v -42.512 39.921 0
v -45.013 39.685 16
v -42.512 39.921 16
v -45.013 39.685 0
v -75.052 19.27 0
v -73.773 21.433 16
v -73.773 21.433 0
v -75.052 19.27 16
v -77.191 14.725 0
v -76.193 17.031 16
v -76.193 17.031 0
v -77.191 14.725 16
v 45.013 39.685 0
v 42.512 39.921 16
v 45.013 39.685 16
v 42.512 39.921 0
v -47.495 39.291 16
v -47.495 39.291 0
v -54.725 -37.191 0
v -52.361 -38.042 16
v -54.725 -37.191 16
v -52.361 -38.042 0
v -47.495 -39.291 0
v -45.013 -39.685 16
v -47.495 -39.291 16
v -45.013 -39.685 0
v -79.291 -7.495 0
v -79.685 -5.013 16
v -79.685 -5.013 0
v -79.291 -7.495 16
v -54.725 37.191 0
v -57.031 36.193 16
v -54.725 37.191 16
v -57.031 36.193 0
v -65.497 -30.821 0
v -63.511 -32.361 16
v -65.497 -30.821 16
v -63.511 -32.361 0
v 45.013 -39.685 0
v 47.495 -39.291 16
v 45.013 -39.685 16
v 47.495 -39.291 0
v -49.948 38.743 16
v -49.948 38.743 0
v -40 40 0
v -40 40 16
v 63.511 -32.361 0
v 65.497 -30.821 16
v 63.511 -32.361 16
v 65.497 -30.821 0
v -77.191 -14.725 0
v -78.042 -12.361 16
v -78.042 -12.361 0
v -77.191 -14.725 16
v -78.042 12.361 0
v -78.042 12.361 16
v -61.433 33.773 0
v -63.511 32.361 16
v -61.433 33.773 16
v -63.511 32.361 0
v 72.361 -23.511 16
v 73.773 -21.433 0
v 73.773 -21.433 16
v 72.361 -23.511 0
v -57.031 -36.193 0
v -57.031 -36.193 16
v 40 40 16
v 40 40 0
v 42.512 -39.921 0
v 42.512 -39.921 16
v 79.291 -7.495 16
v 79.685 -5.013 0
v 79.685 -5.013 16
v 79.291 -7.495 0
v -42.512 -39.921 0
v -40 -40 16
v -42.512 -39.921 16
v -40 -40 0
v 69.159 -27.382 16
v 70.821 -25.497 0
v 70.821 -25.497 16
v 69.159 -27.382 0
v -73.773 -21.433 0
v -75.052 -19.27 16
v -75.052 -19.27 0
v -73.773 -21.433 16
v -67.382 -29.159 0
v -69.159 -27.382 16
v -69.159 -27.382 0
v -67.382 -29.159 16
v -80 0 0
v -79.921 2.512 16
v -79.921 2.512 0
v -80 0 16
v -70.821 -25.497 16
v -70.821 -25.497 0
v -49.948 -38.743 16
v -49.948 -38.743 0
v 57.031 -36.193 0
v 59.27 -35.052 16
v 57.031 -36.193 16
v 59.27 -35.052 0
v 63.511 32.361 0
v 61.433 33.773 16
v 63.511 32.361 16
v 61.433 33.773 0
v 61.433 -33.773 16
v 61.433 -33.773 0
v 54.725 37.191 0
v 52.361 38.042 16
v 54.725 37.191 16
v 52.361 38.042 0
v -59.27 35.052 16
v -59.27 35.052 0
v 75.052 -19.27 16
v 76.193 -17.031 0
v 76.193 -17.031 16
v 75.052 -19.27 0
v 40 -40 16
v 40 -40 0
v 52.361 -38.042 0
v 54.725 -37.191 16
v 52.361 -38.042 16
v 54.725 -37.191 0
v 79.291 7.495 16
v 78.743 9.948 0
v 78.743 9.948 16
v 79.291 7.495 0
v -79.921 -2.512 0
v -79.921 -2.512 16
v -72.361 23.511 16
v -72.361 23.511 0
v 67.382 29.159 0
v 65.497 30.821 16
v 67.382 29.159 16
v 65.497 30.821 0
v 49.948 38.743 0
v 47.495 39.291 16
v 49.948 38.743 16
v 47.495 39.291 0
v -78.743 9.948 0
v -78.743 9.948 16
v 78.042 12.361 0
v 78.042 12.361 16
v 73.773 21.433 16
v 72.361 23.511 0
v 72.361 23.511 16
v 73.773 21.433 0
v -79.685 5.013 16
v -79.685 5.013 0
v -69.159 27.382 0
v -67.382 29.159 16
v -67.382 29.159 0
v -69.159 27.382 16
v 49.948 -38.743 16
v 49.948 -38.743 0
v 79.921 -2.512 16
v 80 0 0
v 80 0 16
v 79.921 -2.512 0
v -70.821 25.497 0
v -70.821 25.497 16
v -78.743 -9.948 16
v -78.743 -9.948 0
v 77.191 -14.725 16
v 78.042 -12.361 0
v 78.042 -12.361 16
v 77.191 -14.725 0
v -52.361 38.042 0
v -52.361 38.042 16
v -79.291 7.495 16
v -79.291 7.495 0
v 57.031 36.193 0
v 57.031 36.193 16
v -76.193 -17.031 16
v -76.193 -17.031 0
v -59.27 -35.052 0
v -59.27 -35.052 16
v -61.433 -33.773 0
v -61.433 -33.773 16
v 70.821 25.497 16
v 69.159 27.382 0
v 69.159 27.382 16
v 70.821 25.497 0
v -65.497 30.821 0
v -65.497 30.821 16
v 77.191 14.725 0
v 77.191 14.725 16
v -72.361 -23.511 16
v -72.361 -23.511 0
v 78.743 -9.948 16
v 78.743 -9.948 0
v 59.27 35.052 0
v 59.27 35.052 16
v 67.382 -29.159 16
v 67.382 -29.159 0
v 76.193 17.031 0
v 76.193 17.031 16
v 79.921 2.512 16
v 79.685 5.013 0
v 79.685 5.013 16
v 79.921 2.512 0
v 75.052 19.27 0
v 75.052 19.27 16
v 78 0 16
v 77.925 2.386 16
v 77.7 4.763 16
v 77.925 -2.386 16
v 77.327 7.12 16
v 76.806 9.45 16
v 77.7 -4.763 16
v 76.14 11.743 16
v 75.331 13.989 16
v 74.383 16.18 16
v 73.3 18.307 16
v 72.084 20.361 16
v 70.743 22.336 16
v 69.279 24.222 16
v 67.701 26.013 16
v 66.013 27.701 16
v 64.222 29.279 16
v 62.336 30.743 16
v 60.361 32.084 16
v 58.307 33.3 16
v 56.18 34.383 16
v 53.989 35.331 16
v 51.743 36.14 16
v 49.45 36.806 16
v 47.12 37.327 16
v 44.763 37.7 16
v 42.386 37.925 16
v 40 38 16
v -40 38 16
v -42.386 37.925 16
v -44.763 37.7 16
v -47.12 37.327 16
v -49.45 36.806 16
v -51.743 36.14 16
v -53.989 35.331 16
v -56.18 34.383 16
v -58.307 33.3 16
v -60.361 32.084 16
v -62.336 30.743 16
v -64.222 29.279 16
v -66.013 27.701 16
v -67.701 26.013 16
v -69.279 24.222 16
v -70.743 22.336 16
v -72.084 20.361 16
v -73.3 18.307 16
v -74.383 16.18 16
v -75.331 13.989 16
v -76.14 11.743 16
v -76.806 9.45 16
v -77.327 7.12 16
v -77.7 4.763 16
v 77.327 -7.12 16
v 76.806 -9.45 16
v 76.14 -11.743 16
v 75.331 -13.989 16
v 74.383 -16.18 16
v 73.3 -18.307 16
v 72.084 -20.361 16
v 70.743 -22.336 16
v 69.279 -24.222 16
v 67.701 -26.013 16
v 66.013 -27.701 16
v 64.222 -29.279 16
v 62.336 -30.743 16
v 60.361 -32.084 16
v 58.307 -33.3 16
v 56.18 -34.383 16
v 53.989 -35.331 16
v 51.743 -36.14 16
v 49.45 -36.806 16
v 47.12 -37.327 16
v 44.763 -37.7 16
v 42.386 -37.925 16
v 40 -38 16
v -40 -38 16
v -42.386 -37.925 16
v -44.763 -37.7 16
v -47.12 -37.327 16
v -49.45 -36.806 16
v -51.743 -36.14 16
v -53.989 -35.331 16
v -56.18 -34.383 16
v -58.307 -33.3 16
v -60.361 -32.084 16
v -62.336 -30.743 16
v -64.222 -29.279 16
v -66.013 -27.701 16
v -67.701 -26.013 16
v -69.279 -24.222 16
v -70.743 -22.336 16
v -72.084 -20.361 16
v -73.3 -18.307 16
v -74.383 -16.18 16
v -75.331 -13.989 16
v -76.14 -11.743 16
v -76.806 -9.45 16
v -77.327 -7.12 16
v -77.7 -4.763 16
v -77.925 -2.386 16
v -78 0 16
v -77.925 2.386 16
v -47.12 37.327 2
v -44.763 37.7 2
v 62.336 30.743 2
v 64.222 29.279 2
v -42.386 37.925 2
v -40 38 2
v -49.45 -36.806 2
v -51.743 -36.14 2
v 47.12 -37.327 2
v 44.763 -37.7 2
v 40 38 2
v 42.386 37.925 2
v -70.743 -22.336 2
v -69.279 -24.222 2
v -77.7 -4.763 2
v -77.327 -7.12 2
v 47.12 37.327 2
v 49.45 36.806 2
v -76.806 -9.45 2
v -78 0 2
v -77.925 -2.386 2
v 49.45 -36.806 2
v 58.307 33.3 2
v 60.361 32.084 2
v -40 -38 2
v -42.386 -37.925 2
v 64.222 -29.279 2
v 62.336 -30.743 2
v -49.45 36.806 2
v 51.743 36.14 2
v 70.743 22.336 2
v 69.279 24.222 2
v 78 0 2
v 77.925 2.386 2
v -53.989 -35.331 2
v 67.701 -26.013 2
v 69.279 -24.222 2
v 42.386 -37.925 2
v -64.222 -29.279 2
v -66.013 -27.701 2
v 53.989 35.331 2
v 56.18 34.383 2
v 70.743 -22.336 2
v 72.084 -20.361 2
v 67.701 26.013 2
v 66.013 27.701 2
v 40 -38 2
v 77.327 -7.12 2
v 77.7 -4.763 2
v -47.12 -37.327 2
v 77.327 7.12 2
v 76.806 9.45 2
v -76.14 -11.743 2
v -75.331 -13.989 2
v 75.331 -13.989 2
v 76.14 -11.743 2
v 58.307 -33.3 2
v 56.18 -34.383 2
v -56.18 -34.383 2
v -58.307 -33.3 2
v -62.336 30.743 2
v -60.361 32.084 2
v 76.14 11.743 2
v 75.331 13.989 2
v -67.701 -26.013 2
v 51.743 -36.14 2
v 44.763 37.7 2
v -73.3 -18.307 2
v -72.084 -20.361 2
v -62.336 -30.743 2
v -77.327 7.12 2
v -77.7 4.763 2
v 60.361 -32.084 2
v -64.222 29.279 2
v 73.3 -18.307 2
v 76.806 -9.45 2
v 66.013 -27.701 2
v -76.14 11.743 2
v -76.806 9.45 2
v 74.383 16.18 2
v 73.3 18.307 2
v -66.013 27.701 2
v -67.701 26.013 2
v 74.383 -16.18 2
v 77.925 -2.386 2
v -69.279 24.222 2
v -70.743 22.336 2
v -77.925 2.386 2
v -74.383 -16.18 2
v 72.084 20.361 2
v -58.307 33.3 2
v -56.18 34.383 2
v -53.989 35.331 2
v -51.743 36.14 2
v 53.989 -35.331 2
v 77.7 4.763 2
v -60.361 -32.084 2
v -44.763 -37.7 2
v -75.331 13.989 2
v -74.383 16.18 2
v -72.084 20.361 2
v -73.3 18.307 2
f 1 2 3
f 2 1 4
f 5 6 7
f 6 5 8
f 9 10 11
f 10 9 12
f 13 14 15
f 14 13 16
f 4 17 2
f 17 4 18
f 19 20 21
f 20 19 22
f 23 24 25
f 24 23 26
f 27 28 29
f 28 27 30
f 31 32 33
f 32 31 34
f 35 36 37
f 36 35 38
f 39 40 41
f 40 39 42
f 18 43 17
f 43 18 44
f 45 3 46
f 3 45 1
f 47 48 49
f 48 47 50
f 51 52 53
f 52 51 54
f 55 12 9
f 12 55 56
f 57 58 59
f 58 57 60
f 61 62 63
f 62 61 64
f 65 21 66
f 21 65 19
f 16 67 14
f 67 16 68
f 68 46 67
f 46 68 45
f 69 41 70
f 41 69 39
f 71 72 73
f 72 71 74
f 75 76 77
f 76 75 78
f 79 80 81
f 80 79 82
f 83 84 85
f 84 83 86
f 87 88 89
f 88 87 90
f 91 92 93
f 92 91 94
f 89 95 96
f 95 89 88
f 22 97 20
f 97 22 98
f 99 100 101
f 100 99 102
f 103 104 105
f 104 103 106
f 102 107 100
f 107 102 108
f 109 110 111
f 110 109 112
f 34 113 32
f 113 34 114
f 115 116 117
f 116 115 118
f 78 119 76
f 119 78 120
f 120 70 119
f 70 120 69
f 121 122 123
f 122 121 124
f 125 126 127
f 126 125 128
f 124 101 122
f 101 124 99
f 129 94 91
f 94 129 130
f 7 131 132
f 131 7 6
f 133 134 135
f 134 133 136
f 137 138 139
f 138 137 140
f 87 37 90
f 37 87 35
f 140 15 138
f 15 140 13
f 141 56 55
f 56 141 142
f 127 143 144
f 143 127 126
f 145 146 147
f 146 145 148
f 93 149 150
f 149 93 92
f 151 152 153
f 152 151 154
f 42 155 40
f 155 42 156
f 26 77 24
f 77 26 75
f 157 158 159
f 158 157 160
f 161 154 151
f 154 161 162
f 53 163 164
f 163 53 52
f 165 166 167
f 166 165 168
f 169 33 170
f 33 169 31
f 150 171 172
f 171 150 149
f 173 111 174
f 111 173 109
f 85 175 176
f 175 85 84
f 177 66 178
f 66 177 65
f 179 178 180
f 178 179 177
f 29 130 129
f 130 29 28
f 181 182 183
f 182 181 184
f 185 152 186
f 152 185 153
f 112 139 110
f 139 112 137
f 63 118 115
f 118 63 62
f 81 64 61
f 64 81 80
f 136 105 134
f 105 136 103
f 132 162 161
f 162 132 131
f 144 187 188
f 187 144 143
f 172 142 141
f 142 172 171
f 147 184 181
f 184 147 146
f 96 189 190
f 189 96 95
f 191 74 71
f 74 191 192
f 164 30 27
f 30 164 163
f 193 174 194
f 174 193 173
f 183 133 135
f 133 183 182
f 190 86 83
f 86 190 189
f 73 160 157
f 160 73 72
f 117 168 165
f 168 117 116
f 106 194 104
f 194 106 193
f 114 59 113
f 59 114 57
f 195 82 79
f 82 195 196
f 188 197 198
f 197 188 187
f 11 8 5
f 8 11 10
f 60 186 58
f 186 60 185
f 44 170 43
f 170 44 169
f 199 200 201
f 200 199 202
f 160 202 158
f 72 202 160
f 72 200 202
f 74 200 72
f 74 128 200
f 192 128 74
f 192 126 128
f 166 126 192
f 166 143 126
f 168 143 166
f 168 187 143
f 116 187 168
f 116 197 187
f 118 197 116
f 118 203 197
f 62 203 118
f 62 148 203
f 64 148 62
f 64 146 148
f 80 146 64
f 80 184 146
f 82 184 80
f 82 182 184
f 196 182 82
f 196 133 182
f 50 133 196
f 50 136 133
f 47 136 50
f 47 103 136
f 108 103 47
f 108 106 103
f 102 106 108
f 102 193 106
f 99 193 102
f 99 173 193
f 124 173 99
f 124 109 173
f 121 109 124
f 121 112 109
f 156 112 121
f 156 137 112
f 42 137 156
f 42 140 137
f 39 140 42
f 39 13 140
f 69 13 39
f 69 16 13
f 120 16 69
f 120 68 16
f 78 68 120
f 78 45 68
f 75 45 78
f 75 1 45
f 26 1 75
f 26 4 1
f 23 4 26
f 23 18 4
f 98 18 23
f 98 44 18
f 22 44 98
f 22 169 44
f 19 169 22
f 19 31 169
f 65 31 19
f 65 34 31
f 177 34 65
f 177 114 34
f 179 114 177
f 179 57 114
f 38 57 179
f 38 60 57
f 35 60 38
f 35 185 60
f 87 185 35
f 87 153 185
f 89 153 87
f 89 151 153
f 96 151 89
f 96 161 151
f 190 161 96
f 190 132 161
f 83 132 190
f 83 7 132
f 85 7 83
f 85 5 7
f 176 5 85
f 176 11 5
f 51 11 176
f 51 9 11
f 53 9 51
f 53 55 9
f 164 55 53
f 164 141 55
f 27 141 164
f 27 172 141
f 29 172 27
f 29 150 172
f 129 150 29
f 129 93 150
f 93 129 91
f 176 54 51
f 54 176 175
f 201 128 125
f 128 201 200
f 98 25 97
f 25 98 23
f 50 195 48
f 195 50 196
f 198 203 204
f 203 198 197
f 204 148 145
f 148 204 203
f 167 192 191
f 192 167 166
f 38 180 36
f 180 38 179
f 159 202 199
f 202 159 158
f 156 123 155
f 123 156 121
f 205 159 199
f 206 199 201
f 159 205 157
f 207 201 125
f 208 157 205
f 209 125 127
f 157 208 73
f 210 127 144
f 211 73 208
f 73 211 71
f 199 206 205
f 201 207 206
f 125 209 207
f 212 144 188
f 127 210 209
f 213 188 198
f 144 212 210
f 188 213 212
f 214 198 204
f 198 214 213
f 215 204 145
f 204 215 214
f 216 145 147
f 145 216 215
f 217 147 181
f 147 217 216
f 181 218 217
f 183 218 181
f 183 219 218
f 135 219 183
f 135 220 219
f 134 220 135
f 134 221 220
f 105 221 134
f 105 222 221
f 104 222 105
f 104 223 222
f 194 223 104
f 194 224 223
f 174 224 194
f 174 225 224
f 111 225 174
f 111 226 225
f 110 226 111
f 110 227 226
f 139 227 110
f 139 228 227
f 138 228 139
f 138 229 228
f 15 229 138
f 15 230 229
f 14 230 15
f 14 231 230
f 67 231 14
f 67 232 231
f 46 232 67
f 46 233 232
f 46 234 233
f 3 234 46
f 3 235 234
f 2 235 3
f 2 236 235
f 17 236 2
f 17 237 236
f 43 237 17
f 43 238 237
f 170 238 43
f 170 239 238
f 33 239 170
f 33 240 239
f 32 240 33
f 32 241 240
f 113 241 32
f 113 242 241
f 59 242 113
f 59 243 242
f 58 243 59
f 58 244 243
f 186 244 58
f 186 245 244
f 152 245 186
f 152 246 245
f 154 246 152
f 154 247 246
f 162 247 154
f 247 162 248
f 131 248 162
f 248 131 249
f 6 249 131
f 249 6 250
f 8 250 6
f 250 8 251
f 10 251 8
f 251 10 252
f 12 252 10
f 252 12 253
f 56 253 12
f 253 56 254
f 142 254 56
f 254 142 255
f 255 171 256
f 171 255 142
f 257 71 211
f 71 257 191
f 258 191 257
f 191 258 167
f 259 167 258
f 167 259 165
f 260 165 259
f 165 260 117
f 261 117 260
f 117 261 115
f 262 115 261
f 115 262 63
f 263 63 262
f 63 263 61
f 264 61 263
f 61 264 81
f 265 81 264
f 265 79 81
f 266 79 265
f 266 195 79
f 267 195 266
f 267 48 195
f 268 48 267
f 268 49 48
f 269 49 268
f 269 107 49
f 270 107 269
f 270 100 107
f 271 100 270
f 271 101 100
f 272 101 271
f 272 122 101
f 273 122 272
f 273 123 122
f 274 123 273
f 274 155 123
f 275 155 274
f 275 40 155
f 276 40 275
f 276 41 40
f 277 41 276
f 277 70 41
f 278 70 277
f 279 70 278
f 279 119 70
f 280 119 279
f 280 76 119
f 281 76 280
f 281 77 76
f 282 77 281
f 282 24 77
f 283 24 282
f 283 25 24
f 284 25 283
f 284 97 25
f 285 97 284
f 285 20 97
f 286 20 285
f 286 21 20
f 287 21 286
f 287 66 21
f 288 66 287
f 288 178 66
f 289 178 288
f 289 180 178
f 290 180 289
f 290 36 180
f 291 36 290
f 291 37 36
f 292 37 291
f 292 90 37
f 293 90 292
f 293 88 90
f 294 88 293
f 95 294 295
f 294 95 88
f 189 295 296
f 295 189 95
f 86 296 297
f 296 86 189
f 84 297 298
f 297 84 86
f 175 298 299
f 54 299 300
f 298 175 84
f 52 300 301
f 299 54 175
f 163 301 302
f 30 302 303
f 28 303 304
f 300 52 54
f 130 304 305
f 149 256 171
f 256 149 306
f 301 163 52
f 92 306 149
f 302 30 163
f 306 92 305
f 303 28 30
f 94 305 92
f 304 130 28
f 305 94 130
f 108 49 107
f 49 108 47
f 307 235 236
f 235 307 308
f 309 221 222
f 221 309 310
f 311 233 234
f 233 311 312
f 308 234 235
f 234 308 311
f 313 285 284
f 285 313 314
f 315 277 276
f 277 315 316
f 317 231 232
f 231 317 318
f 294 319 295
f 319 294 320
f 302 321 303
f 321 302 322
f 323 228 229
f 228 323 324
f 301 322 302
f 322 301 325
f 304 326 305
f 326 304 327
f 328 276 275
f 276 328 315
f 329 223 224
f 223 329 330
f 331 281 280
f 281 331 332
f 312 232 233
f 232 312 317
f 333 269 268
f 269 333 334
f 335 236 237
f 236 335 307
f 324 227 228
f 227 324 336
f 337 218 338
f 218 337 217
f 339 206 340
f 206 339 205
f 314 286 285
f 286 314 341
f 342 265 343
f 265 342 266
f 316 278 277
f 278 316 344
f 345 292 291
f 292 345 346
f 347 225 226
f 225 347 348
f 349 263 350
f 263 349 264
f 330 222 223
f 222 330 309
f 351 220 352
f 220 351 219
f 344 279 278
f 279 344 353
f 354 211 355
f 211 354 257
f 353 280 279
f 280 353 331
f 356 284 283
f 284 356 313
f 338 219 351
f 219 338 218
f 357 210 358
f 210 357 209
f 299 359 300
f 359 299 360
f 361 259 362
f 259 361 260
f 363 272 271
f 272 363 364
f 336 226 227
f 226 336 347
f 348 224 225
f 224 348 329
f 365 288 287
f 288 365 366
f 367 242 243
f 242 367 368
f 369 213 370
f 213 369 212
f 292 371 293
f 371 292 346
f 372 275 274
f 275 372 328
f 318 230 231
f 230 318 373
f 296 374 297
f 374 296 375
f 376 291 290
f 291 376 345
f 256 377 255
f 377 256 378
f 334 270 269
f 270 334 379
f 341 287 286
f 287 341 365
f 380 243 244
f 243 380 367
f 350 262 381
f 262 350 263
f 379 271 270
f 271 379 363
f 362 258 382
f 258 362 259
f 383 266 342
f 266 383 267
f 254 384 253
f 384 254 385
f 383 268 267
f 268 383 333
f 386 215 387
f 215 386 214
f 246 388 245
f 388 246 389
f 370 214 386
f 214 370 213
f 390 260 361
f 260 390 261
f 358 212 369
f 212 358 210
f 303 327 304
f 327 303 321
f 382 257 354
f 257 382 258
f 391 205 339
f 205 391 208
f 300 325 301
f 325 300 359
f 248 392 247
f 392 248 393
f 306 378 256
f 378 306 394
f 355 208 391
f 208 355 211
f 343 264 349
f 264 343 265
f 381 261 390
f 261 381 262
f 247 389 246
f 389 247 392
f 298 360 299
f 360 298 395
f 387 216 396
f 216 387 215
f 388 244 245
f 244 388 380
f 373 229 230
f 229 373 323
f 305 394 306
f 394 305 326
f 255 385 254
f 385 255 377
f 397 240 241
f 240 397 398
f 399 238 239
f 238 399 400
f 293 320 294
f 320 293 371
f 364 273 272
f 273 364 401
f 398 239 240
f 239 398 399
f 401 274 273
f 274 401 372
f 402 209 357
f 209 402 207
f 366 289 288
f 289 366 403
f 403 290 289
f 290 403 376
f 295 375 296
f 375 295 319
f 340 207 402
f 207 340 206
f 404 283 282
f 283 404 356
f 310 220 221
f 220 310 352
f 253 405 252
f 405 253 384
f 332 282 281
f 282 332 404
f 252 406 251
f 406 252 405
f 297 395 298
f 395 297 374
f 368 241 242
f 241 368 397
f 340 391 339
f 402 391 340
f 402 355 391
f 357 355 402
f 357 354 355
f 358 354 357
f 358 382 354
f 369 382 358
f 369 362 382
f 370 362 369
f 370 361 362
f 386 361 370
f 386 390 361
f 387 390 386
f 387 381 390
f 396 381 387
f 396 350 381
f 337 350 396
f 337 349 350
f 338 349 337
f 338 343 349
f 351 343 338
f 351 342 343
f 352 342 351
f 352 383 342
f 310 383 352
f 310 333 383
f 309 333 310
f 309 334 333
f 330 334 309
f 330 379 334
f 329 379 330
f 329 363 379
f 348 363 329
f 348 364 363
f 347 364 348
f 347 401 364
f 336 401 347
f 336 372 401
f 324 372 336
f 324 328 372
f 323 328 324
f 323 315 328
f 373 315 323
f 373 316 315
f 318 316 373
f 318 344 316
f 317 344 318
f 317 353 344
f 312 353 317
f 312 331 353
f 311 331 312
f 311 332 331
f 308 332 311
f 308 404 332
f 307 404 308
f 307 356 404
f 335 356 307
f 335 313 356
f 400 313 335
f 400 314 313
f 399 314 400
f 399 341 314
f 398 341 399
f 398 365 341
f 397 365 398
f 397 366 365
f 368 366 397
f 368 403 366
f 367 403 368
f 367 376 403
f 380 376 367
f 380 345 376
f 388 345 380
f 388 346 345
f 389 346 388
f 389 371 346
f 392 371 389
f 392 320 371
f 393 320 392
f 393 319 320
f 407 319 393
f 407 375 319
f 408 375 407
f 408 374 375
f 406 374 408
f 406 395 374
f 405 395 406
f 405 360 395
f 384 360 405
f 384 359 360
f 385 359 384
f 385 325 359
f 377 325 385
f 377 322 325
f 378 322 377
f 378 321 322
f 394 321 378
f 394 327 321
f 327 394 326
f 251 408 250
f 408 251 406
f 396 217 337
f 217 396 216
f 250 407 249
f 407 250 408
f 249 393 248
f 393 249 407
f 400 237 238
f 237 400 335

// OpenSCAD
echo(version=version());

wall = 2;
$fn = 100;

color("green")
difference() {
    linear_extrude(height = 16)
        union() {
            square([80, 80], center = true);
            translate([40,0,0])
                circle(r = 40);
            translate([-40,0,0])
                circle(r = 40);
        }
    translate([0,0,wall])
        linear_extrude(height = 16)
            union() {
                square([80, 80 - 2 * wall], center = true);
                translate([40,0,0])
                    circle(r = 40 - wall);
                translate([-40,0,0])
                    circle(r = 40 - wall);
            }
}
